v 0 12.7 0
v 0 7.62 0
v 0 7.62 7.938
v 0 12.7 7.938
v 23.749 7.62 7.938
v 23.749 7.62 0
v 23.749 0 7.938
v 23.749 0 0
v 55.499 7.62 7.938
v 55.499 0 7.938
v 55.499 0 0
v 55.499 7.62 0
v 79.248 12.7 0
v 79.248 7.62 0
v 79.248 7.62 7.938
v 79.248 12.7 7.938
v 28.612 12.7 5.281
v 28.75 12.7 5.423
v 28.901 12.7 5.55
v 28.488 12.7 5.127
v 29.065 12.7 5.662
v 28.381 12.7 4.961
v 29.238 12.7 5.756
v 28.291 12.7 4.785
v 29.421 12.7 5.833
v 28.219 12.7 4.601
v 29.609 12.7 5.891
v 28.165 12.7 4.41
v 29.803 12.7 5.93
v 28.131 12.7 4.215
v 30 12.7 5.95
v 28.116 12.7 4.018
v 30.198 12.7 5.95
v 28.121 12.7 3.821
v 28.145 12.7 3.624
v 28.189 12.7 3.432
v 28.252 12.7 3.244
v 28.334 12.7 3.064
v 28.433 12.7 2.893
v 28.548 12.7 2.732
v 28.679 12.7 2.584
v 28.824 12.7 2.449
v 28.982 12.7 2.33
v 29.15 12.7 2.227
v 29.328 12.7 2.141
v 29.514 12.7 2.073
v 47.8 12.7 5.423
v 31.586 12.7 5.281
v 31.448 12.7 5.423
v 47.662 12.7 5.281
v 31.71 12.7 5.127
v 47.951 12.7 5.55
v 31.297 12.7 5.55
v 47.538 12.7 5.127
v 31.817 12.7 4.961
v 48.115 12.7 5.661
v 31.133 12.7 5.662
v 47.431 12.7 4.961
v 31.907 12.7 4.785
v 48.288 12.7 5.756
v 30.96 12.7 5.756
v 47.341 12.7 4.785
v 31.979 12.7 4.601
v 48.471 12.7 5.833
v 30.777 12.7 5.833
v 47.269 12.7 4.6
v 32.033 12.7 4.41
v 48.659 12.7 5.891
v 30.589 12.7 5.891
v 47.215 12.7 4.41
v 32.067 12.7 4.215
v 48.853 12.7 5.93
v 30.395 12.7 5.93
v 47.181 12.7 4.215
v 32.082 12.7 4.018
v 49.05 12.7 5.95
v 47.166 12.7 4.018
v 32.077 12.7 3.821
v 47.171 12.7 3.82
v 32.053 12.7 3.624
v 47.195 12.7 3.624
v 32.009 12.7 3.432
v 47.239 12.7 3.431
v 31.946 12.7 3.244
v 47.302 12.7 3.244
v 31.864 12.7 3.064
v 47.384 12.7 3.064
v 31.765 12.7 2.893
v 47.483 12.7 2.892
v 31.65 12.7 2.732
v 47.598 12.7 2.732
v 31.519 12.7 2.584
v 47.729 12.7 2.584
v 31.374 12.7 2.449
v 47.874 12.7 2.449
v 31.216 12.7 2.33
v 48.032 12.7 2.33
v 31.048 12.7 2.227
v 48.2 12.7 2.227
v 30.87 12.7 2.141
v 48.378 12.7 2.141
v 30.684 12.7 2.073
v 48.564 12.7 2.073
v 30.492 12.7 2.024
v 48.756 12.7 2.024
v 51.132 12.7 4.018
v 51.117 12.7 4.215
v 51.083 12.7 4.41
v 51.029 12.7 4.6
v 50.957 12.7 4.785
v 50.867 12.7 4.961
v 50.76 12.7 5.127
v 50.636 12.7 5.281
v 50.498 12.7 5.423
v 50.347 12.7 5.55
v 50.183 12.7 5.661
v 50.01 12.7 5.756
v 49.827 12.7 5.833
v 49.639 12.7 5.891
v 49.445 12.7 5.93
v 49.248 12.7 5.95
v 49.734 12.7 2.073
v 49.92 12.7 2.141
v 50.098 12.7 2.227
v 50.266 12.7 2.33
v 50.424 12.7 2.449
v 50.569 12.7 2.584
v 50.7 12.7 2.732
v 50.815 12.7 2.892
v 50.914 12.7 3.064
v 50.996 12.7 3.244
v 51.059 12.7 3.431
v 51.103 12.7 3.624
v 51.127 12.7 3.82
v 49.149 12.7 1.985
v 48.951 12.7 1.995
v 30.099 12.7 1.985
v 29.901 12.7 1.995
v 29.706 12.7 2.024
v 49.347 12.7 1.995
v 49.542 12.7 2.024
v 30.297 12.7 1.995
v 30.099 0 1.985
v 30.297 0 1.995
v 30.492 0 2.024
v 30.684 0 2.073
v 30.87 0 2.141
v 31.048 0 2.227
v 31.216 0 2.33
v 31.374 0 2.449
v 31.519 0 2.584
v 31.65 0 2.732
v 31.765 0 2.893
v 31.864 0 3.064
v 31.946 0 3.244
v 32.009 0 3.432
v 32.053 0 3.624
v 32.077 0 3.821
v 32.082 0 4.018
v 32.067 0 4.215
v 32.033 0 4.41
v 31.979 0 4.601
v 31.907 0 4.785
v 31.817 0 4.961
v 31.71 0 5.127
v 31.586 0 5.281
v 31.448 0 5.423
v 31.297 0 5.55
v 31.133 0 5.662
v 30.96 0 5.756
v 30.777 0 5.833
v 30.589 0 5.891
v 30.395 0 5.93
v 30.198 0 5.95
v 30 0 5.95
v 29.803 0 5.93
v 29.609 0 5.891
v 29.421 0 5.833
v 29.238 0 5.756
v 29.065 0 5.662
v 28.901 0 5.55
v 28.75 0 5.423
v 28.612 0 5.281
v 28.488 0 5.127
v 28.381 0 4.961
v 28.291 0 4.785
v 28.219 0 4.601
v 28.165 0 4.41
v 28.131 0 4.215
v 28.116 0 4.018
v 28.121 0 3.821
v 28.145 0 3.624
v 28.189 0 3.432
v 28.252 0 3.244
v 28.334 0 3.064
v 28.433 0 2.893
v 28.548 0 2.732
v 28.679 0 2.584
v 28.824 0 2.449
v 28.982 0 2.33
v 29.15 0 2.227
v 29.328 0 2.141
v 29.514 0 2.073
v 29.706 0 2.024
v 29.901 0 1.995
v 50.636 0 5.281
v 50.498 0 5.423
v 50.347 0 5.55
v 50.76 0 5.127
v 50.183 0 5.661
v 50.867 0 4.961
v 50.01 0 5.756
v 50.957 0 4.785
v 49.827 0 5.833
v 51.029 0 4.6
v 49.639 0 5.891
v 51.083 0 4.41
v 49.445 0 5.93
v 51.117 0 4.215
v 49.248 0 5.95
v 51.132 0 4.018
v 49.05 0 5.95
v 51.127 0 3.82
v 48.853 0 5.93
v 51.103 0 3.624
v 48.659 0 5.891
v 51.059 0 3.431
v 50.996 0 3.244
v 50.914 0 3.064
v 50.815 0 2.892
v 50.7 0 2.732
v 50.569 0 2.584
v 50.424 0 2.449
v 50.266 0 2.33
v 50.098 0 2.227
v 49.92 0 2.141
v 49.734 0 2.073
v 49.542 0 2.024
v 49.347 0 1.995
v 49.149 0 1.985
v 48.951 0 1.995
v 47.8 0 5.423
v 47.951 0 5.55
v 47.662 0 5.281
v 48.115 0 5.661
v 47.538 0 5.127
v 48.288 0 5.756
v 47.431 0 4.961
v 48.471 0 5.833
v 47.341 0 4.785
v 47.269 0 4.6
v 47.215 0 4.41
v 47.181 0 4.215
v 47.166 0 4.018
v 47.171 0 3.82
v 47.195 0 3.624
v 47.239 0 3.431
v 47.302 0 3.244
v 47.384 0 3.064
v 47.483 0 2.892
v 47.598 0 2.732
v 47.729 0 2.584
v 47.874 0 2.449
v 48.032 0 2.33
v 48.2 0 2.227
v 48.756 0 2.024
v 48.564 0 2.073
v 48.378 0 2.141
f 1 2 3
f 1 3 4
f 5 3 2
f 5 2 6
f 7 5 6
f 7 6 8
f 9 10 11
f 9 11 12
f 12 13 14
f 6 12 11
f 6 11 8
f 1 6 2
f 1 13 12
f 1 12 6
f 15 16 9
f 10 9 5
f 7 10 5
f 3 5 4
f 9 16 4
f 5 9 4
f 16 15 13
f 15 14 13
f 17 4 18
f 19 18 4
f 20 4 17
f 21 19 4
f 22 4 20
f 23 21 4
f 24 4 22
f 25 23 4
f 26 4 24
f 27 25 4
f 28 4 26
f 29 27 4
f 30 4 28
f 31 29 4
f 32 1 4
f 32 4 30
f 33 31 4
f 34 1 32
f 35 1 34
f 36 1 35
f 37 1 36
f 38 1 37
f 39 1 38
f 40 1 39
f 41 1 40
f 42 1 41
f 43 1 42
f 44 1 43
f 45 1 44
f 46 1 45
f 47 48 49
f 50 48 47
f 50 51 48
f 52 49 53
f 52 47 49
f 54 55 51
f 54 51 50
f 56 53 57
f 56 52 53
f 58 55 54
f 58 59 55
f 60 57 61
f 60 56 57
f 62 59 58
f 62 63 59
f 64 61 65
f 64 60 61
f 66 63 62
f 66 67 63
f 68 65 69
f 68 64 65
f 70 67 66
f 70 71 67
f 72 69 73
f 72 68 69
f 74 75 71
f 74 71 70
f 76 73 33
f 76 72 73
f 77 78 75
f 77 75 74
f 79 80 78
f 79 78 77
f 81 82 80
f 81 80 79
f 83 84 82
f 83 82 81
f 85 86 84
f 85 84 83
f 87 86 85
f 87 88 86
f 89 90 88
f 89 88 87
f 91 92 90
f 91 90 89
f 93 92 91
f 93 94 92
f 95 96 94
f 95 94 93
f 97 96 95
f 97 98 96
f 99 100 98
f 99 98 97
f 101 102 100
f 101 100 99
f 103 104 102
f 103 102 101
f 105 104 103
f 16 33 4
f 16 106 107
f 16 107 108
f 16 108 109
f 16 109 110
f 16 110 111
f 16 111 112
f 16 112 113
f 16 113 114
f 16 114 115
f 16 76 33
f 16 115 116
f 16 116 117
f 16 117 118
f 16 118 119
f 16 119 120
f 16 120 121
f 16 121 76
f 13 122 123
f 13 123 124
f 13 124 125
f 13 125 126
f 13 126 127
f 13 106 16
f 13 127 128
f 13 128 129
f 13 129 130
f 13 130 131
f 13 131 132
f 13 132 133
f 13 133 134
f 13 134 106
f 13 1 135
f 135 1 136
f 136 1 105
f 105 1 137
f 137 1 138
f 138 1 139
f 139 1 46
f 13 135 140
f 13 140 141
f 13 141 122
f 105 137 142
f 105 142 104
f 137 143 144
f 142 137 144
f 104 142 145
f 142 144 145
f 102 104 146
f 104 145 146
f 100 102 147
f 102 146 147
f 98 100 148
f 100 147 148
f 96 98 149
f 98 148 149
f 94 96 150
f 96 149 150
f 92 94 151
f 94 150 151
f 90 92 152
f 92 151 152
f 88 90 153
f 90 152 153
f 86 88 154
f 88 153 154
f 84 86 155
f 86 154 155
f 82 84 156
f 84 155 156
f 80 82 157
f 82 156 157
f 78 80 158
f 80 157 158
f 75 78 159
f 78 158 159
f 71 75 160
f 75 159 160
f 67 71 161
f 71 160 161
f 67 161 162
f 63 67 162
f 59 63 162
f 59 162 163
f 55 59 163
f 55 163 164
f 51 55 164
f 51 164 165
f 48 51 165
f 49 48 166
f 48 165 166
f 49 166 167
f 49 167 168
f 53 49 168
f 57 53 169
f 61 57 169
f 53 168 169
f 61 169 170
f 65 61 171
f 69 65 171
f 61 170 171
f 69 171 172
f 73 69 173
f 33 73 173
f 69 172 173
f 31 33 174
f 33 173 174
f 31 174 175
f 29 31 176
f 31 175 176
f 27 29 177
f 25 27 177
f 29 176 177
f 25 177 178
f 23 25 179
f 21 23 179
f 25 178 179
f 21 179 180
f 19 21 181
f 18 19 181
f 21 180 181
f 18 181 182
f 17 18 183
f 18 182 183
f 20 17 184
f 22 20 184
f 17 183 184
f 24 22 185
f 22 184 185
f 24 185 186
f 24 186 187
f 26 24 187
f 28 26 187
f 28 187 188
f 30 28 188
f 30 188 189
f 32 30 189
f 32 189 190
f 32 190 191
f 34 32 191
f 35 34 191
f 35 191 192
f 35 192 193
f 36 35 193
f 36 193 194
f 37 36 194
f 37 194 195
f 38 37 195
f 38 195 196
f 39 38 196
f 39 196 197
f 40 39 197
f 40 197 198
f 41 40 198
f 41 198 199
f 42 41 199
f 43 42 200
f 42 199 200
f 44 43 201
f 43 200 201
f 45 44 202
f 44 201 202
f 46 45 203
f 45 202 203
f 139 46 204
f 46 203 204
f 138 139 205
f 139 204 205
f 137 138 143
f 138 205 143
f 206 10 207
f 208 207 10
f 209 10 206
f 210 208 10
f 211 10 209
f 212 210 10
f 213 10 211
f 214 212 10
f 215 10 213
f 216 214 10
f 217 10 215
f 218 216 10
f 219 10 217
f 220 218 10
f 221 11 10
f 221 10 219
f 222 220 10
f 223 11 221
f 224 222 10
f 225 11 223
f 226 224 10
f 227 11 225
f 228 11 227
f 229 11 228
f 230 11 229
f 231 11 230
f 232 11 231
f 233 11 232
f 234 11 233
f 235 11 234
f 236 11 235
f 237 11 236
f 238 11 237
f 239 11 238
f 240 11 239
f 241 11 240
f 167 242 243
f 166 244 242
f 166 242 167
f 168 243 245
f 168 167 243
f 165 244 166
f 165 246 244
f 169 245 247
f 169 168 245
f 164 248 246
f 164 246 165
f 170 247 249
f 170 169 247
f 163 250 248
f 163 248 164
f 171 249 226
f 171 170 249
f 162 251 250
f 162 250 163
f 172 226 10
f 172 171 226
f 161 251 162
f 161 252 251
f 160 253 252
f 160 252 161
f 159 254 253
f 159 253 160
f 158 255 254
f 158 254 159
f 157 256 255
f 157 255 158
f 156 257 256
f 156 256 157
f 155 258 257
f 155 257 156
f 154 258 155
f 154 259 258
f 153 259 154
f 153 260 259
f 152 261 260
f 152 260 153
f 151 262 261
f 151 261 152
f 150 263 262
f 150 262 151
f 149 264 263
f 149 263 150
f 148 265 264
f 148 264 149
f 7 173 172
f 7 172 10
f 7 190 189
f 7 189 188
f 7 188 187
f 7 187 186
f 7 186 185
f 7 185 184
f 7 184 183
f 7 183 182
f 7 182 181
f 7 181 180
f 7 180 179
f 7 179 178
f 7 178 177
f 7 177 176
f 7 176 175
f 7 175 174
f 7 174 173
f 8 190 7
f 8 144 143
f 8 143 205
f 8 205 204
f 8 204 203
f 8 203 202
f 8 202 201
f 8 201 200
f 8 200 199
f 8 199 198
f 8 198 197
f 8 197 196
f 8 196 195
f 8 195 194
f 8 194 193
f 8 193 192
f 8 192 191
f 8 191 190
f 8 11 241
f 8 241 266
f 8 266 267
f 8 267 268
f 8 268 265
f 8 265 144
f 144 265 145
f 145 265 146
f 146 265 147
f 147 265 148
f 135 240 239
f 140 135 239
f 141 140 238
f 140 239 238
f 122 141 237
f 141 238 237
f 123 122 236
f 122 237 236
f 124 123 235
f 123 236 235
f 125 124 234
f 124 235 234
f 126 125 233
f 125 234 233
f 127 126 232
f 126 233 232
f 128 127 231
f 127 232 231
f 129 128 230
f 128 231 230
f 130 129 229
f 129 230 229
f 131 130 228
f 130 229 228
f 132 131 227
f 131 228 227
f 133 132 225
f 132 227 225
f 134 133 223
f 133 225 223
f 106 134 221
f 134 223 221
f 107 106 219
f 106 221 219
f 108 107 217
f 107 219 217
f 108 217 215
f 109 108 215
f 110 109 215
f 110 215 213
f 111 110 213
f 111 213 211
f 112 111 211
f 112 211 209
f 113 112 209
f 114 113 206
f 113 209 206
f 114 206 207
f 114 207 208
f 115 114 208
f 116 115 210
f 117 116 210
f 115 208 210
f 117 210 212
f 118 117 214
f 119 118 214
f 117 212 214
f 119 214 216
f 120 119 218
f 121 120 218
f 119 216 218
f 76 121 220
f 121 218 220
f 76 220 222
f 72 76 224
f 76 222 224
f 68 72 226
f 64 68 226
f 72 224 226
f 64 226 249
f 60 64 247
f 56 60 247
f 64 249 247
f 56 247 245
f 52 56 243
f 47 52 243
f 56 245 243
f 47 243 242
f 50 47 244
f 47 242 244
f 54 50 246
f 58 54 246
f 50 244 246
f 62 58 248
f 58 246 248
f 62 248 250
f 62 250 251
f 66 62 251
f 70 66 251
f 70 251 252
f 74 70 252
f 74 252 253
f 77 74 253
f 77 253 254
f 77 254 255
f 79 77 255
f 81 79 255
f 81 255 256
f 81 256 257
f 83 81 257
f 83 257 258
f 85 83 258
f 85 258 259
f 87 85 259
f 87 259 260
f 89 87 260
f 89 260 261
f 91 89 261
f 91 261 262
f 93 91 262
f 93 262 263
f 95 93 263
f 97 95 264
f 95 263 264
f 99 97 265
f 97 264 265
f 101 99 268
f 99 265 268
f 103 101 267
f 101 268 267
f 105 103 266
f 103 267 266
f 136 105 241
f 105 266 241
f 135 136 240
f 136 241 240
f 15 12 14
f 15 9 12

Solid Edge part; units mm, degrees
sketch "Sketch1" plane through (0, 0, 0) normal (0, 0, 1) x (1, 0, 0)
  line L0 (0, 0) -> (0, 12.7)
  line L1 (0, 12.7) -> (79.248, 12.7)
  line L2 (79.248, 0) -> (79.248, 12.7)
  line L3 (79.248, 0) -> (0, 0)
  dimension "D1" = 12.7
  dimension "D2" = 79.248
extrude "Protrusion1" add sketch "Sketch1" along normal blind 7.9375
sketch "Sketch2" plane through (39.624, 6.35, 7.9375) normal (0, 0, 1) x (1, 0, 0)
  line L0 (-39.624, 1.27) -> (-15.875, 1.27)
  line L1 (-15.875, 1.27) -> (-15.875, -6.35)
  line L2 (-15.875, -6.35) -> (-39.624, -6.35)
  line L3 (-39.624, -6.35) -> (-39.624, 1.27)
  line L4 (15.875, -6.35) -> (15.875, 1.27)
  line L5 (15.875, 1.27) -> (39.624, 1.27)
  line L6 (39.624, 1.27) -> (39.624, -6.35)
  line L7 (39.624, -6.35) -> (15.875, -6.35)
  dimension "D1" = 7.62
  dimension "D2" = 7.62
  dimension "D3" = 15.875
  dimension "D4" = 15.875
extrude "Cutout1" cut sketch "Sketch2" against normal through all
hole "Hole_1" at (49.149, 0, 3.9687) direction (0, 1, 0) diameter 3.9675 end up to next
hole "Hole1" at (30.099, 0, 3.9688) direction (0, 1, 0) diameter 3.9675 end up to next
properties material "Aluminum, 6061-T6"
